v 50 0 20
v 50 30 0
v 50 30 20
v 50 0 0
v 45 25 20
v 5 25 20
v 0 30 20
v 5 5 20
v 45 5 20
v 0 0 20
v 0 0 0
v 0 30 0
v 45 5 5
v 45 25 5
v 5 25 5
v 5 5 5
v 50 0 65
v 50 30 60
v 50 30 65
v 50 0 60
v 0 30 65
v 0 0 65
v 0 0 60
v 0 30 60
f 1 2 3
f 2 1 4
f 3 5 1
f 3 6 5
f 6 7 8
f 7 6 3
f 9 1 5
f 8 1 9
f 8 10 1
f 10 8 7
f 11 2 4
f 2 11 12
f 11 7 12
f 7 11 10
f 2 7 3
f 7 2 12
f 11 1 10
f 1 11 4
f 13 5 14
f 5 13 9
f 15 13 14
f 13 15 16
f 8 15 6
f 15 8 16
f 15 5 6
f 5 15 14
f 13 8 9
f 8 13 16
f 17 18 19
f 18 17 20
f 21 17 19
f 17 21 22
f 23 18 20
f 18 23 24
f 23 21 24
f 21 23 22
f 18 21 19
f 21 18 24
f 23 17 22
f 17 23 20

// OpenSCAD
/*
 * Various modules to create a maintanence panel.
 */

module cabinet(width = 50, height = 30, depth = 20, border = 5) {
    difference() {
        cube([width, height, depth]);
        translate([border, border, border]) cube([width - 2*border, height - 2*border, depth]);
    };
}

module cover(width = 50, height = 30, depth = 5) {
    cube([width, height, depth]);
}

translate([0, 0, 0]) cabinet();
translate([0, 0, 60]) cover();
